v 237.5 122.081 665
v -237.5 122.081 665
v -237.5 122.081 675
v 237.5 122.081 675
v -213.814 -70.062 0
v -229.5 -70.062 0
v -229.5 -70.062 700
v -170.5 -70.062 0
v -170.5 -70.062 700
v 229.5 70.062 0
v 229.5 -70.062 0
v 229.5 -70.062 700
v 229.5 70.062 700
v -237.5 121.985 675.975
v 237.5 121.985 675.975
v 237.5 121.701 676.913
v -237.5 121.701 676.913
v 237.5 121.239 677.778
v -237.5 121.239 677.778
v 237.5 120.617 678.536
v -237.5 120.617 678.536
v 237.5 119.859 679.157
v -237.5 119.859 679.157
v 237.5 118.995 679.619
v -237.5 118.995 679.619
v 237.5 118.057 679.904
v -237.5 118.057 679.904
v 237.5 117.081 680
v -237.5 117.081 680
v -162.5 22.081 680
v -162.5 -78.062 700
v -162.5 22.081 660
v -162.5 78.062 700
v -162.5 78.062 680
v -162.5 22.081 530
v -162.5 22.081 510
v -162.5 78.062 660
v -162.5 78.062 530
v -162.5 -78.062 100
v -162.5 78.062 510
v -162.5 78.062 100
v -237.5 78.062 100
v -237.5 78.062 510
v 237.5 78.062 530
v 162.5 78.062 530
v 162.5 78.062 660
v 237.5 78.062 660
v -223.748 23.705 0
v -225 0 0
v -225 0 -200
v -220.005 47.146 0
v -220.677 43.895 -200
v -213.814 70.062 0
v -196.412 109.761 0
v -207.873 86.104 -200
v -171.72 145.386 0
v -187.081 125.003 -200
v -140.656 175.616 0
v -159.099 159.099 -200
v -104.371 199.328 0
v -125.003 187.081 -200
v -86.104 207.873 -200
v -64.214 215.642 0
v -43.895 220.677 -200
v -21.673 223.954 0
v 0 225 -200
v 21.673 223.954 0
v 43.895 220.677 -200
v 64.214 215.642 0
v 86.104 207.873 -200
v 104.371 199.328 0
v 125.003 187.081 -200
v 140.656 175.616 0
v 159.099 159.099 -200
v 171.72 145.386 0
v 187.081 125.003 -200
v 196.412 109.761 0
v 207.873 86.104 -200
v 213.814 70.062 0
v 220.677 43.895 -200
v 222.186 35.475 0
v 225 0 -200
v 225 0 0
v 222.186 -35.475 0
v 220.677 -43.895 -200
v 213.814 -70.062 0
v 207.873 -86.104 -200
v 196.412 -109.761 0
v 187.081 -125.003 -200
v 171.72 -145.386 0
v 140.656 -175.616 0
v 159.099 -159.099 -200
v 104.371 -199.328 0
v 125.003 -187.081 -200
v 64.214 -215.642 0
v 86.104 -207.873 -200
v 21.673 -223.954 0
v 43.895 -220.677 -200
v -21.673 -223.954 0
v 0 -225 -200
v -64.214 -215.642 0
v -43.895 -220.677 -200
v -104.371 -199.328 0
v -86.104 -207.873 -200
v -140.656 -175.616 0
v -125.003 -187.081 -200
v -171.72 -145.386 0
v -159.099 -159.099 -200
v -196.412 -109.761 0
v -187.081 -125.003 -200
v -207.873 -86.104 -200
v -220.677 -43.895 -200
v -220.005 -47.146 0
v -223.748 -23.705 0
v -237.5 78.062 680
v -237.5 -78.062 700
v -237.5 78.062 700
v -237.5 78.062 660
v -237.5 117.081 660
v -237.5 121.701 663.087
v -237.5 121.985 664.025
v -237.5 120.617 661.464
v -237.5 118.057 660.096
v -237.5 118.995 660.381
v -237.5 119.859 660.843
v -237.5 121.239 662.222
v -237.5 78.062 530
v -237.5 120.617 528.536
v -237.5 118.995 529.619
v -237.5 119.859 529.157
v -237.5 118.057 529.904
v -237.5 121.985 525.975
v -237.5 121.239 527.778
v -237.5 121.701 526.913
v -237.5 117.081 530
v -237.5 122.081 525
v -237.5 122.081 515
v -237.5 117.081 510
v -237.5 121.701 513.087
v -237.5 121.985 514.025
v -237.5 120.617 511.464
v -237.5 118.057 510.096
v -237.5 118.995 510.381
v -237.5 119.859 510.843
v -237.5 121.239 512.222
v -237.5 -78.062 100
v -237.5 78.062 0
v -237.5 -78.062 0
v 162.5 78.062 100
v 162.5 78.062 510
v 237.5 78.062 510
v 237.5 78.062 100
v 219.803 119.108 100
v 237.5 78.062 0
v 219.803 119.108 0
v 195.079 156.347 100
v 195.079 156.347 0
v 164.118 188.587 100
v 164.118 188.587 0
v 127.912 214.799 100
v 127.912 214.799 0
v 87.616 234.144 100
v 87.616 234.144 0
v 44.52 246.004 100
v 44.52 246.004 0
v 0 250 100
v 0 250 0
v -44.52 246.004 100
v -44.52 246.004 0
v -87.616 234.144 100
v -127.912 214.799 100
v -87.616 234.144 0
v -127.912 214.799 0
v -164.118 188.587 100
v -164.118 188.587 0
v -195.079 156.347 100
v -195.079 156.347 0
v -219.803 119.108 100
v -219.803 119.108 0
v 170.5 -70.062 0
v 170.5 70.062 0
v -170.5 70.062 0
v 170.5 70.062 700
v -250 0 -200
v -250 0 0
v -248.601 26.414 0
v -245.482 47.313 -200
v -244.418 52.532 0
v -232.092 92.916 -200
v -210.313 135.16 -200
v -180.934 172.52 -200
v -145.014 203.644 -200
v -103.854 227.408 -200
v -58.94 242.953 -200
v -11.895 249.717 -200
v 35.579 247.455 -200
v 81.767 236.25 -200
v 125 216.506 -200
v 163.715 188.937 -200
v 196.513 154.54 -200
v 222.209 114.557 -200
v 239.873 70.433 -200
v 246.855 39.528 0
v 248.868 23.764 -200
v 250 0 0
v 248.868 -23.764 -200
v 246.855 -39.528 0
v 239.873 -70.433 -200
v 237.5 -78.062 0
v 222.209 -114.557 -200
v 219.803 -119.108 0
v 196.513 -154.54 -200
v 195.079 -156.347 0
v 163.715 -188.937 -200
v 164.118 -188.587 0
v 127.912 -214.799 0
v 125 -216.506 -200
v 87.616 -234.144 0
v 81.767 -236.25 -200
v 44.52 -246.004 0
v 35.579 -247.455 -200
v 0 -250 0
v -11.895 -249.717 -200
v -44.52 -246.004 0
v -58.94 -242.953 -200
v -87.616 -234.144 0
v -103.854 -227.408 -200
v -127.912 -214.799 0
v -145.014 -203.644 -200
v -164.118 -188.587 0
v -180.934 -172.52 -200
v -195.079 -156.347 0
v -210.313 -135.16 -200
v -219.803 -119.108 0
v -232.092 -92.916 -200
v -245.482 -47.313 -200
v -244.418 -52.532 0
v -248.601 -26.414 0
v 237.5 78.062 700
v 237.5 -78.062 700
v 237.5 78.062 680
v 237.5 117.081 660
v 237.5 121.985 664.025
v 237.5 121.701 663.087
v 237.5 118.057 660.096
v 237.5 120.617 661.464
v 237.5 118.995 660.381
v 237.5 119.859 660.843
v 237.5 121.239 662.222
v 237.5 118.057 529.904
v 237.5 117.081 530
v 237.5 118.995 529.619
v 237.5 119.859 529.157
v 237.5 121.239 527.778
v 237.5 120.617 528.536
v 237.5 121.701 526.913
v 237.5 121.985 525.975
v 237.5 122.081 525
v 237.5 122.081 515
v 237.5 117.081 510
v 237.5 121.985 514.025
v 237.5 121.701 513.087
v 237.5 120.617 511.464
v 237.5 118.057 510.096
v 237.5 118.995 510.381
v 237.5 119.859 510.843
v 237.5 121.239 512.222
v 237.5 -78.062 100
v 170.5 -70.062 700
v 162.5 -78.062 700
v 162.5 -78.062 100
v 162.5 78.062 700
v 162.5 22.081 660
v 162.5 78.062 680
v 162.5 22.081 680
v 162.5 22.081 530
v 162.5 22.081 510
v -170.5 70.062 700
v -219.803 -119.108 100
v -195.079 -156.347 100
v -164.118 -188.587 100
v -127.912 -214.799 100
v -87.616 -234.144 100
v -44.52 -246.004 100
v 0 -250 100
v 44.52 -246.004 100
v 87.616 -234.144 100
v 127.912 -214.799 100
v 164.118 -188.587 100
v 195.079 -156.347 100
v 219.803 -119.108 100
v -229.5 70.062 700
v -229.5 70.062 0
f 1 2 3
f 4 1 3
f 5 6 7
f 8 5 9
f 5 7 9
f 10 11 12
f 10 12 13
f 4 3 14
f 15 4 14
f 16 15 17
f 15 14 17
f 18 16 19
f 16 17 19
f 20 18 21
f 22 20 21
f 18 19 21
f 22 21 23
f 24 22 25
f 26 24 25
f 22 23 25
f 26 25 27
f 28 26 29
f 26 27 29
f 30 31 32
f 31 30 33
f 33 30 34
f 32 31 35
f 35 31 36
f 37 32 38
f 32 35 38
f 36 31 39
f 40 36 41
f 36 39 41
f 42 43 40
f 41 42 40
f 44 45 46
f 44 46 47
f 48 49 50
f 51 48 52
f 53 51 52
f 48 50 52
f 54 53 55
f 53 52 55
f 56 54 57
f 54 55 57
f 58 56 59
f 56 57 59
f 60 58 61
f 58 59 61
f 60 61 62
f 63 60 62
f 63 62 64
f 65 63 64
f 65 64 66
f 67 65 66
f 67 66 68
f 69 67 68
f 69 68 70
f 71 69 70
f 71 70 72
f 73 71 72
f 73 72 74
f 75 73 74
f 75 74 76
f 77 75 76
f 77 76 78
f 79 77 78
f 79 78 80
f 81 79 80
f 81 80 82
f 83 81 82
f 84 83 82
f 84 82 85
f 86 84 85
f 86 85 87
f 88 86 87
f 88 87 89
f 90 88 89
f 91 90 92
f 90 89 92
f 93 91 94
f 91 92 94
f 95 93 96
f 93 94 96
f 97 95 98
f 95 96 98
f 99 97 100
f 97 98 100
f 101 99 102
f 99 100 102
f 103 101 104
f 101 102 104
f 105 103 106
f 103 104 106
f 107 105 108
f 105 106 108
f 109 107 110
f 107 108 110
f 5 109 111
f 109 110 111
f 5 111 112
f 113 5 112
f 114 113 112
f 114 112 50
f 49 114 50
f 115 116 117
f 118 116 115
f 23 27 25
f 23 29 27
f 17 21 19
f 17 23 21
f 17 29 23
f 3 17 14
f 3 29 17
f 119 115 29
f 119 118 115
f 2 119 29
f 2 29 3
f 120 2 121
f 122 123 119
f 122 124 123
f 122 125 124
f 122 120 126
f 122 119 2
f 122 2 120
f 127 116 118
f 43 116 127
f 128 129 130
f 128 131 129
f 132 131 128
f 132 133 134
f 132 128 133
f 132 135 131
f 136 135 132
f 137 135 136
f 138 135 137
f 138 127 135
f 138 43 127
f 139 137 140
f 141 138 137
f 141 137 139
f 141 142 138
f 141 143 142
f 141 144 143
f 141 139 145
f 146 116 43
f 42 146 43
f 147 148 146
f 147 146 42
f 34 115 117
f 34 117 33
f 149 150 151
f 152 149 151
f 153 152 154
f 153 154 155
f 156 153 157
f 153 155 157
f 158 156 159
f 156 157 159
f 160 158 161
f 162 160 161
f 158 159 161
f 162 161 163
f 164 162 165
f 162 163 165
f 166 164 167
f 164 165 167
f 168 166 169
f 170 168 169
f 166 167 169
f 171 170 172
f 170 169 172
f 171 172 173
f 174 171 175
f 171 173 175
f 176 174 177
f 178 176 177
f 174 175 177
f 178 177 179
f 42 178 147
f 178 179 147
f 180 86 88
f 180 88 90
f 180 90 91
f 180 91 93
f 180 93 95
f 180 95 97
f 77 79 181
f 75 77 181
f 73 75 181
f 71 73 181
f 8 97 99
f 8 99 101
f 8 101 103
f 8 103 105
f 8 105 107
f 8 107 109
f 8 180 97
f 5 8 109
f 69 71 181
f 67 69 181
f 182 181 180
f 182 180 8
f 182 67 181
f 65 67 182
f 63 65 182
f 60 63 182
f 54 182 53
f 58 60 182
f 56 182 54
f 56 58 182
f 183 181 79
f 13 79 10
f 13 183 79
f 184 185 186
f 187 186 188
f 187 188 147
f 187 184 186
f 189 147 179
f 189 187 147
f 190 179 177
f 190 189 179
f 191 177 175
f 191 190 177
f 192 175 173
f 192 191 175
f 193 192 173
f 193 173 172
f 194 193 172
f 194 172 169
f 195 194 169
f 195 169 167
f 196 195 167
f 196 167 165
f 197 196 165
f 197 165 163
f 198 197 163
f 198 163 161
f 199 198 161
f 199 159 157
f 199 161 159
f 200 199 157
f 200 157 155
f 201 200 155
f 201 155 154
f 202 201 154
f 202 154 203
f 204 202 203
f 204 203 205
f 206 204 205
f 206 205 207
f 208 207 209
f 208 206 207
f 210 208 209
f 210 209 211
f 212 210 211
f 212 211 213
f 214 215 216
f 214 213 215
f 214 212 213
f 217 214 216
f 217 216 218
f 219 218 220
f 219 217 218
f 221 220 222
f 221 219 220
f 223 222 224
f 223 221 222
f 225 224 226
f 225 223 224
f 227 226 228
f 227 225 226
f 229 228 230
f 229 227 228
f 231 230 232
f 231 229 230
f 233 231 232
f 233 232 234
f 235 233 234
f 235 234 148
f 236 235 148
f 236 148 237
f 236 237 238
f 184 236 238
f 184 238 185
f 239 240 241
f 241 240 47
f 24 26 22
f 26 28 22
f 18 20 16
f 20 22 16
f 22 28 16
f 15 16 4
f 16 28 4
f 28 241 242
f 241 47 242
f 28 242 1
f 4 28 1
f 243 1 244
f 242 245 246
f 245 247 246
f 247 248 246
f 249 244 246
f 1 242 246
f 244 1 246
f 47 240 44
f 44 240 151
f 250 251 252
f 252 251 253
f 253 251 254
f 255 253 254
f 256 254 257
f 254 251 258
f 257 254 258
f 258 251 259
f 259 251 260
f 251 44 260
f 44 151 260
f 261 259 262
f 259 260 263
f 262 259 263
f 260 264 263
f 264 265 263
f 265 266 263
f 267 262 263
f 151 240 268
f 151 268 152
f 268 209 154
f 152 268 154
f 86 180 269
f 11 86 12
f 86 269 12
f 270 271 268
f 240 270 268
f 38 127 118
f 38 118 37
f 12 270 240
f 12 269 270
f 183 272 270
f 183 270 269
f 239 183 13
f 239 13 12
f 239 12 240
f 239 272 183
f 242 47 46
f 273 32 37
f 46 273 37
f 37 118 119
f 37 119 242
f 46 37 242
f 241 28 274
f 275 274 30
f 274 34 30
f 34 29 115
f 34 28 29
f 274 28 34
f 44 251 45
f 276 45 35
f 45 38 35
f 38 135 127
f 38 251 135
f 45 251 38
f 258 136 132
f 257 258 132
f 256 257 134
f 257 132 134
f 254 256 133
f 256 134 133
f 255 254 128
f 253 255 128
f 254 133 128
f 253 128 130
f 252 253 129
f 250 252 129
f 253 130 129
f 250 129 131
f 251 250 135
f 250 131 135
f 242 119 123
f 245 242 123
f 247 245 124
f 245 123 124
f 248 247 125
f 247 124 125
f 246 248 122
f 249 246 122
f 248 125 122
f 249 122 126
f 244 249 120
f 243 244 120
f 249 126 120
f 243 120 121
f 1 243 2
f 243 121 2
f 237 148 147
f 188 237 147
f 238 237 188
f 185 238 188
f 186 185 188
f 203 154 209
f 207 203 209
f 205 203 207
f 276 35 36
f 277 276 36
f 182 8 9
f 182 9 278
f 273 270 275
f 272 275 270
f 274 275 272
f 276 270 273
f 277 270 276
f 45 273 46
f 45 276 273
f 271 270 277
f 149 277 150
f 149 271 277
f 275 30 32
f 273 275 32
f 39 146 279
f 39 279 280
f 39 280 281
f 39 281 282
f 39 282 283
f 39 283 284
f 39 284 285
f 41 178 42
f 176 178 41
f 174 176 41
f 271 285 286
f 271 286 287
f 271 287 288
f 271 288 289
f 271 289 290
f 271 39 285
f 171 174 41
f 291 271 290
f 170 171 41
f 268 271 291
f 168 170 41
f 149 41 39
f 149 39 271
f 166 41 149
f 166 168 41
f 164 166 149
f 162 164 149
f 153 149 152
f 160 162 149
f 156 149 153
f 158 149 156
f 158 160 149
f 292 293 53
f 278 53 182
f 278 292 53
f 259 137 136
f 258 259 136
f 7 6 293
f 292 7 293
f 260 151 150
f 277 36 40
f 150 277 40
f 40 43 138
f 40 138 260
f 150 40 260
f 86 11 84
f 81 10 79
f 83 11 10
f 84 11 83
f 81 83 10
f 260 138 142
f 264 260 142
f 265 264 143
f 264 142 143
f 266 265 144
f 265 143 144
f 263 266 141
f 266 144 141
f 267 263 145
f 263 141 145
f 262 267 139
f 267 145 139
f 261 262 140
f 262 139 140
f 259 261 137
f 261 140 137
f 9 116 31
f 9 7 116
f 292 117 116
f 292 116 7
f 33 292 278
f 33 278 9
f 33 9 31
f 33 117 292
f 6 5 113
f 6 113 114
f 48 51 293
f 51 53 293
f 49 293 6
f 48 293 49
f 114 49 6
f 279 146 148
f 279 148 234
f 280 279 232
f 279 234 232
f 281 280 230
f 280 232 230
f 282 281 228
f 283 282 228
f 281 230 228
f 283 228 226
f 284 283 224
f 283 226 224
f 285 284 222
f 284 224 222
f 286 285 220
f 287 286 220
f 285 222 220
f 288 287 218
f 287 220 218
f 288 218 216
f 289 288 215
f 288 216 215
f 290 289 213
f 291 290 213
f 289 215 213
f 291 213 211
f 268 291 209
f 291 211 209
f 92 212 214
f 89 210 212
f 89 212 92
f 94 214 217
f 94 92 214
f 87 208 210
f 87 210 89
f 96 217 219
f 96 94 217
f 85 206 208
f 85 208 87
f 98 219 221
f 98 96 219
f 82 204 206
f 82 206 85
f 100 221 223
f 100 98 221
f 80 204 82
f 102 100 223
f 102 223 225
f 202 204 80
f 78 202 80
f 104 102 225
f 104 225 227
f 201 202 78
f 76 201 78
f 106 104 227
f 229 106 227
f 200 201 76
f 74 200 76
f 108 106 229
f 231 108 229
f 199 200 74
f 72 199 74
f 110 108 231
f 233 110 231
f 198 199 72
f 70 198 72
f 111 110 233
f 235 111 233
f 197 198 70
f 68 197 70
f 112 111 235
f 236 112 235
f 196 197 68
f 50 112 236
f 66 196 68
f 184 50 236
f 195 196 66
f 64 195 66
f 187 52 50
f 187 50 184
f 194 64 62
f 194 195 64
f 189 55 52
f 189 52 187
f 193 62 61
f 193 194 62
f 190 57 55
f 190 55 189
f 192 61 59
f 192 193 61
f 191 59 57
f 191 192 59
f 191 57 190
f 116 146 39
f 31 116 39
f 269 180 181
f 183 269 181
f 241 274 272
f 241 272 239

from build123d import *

# Parameters (mm, degrees)
IZIM1_W                      = 75
IZIM1_H                      = 156.12494996
Y_KSEKLIK_EKSTR_ZYON2_DEPTH  = 100
IZIM3_W                      = 75
IZIM3_H                      = 156.12494996
Y_KSEKLIK_EKSTR_ZYON3_DEPTH  = 600
Y_KSEKLIK_EKSTR_ZYON9_DEPTH  = 475
IZIM12_W                     = 59
IZIM12_H                     = 140.12494996
KES_EKSTR_ZYON3_DEPTH        = 781.324451751
Y_KSEKLIK_EKSTR_ZYON10_START = 200
IZIM13_R                     = 250
Y_KSEKLIK_EKSTR_ZYON10_DEPTH = 200
IZIM15_R                     = 225
KES_EKSTR_ZYON5_DEPTH        = 200


with BuildPart() as part:
    # Çizim1 → Yükseklik-Ekstrüzyon2 (new body)
    with BuildSketch(Plane.XY):
        with BuildLine():
            Line((162.5, 78.06247498), (237.5, 78.06247498))
            ThreePointArc((237.5, 78.06247498), (0, 250), (-237.5, 78.06247498))
            Line((-237.5, 78.06247498), (-162.5, 78.06247498))
            Line((-162.5, 78.06247498), (-162.5, -78.06247498))
            Line((-162.5, -78.06247498), (-237.5, -78.06247498))
            ThreePointArc((-237.5, -78.06247498), (0, -250), (237.5, -78.06247498))
            Line((237.5, -78.06247498), (162.5, -78.06247498))
            Line((162.5, -78.06247498), (162.5, 78.06247498))
        make_face()
        with Locations((-200, 0)):
            Rectangle(IZIM1_W, IZIM1_H)
        with Locations((200, 0)):
            Rectangle(IZIM1_W, IZIM1_H)
    extrude(amount=Y_KSEKLIK_EKSTR_ZYON2_DEPTH)

    # Çizim3 → Yükseklik-Ekstrüzyon3 (add)
    with BuildSketch(Plane.XY.offset(100)):
        with Locations((200, 0)):
            Rectangle(IZIM3_W, IZIM3_H)
        with Locations((-200, 0)):
            Rectangle(IZIM3_W, IZIM3_H)
    extrude(amount=Y_KSEKLIK_EKSTR_ZYON3_DEPTH)

    # Çizim5 → Yükseklik-Ekstrüzyon9 (add, through all)
    with BuildSketch(Plane.ZY.offset(237.5)):
        with BuildLine():
            Line((680, 22.081308318), (660, 22.081308318))
            Line((660, 22.081308318), (660, 117.081308318))
            ThreePointArc((660, 117.081308318), (661.464466094, 120.616842224), (665, 122.081308318))
            Line((665, 122.081308318), (675, 122.081308318))
            ThreePointArc((675, 122.081308318), (678.535533906, 120.616842224), (680, 117.081308318))
            Line((680, 117.081308318), (680, 22.081308318))
        make_face()
        with BuildLine():
            Line((530, 22.081308318), (510, 22.081308318))
            Line((510, 22.081308318), (510, 117.081308318))
            ThreePointArc((510, 117.081308318), (511.464466094, 120.616842224), (515, 122.081308318))
            Line((515, 122.081308318), (525, 122.081308318))
            ThreePointArc((525, 122.081308318), (528.535533906, 120.616842224), (530, 117.081308318))
            Line((530, 117.081308318), (530, 22.081308318))
        make_face()
    extrude(amount=-Y_KSEKLIK_EKSTR_ZYON9_DEPTH)

    # Çizim12 → Kes-Ekstrüzyon3 (cut, through all)
    with BuildSketch(Plane.XY.offset(700)):
        with Locations((-200, 0)):
            Rectangle(IZIM12_W, IZIM12_H)
        with Locations((200, 0)):
            Rectangle(IZIM12_W, IZIM12_H)
    extrude(amount=-KES_EKSTR_ZYON3_DEPTH, mode=Mode.SUBTRACT)

    # Çizim13 → Yükseklik-Ekstrüzyon10 (add)
    with BuildSketch(Plane(origin=(0, 0, 0), x_dir=(-1, 0, 0), z_dir=(0, 0, -1)).offset(Y_KSEKLIK_EKSTR_ZYON10_START)):
        Circle(IZIM13_R)
    extrude(amount=-Y_KSEKLIK_EKSTR_ZYON10_DEPTH)

    # Çizim15 → Kes-Ekstrüzyon5 (cut)
    with BuildSketch(Plane(origin=(0, 0, -200), x_dir=(-1, 0, 0), z_dir=(0, 0, -1))):
        Circle(IZIM15_R)
    extrude(amount=-KES_EKSTR_ZYON5_DEPTH, mode=Mode.SUBTRACT)


solid = part.part
